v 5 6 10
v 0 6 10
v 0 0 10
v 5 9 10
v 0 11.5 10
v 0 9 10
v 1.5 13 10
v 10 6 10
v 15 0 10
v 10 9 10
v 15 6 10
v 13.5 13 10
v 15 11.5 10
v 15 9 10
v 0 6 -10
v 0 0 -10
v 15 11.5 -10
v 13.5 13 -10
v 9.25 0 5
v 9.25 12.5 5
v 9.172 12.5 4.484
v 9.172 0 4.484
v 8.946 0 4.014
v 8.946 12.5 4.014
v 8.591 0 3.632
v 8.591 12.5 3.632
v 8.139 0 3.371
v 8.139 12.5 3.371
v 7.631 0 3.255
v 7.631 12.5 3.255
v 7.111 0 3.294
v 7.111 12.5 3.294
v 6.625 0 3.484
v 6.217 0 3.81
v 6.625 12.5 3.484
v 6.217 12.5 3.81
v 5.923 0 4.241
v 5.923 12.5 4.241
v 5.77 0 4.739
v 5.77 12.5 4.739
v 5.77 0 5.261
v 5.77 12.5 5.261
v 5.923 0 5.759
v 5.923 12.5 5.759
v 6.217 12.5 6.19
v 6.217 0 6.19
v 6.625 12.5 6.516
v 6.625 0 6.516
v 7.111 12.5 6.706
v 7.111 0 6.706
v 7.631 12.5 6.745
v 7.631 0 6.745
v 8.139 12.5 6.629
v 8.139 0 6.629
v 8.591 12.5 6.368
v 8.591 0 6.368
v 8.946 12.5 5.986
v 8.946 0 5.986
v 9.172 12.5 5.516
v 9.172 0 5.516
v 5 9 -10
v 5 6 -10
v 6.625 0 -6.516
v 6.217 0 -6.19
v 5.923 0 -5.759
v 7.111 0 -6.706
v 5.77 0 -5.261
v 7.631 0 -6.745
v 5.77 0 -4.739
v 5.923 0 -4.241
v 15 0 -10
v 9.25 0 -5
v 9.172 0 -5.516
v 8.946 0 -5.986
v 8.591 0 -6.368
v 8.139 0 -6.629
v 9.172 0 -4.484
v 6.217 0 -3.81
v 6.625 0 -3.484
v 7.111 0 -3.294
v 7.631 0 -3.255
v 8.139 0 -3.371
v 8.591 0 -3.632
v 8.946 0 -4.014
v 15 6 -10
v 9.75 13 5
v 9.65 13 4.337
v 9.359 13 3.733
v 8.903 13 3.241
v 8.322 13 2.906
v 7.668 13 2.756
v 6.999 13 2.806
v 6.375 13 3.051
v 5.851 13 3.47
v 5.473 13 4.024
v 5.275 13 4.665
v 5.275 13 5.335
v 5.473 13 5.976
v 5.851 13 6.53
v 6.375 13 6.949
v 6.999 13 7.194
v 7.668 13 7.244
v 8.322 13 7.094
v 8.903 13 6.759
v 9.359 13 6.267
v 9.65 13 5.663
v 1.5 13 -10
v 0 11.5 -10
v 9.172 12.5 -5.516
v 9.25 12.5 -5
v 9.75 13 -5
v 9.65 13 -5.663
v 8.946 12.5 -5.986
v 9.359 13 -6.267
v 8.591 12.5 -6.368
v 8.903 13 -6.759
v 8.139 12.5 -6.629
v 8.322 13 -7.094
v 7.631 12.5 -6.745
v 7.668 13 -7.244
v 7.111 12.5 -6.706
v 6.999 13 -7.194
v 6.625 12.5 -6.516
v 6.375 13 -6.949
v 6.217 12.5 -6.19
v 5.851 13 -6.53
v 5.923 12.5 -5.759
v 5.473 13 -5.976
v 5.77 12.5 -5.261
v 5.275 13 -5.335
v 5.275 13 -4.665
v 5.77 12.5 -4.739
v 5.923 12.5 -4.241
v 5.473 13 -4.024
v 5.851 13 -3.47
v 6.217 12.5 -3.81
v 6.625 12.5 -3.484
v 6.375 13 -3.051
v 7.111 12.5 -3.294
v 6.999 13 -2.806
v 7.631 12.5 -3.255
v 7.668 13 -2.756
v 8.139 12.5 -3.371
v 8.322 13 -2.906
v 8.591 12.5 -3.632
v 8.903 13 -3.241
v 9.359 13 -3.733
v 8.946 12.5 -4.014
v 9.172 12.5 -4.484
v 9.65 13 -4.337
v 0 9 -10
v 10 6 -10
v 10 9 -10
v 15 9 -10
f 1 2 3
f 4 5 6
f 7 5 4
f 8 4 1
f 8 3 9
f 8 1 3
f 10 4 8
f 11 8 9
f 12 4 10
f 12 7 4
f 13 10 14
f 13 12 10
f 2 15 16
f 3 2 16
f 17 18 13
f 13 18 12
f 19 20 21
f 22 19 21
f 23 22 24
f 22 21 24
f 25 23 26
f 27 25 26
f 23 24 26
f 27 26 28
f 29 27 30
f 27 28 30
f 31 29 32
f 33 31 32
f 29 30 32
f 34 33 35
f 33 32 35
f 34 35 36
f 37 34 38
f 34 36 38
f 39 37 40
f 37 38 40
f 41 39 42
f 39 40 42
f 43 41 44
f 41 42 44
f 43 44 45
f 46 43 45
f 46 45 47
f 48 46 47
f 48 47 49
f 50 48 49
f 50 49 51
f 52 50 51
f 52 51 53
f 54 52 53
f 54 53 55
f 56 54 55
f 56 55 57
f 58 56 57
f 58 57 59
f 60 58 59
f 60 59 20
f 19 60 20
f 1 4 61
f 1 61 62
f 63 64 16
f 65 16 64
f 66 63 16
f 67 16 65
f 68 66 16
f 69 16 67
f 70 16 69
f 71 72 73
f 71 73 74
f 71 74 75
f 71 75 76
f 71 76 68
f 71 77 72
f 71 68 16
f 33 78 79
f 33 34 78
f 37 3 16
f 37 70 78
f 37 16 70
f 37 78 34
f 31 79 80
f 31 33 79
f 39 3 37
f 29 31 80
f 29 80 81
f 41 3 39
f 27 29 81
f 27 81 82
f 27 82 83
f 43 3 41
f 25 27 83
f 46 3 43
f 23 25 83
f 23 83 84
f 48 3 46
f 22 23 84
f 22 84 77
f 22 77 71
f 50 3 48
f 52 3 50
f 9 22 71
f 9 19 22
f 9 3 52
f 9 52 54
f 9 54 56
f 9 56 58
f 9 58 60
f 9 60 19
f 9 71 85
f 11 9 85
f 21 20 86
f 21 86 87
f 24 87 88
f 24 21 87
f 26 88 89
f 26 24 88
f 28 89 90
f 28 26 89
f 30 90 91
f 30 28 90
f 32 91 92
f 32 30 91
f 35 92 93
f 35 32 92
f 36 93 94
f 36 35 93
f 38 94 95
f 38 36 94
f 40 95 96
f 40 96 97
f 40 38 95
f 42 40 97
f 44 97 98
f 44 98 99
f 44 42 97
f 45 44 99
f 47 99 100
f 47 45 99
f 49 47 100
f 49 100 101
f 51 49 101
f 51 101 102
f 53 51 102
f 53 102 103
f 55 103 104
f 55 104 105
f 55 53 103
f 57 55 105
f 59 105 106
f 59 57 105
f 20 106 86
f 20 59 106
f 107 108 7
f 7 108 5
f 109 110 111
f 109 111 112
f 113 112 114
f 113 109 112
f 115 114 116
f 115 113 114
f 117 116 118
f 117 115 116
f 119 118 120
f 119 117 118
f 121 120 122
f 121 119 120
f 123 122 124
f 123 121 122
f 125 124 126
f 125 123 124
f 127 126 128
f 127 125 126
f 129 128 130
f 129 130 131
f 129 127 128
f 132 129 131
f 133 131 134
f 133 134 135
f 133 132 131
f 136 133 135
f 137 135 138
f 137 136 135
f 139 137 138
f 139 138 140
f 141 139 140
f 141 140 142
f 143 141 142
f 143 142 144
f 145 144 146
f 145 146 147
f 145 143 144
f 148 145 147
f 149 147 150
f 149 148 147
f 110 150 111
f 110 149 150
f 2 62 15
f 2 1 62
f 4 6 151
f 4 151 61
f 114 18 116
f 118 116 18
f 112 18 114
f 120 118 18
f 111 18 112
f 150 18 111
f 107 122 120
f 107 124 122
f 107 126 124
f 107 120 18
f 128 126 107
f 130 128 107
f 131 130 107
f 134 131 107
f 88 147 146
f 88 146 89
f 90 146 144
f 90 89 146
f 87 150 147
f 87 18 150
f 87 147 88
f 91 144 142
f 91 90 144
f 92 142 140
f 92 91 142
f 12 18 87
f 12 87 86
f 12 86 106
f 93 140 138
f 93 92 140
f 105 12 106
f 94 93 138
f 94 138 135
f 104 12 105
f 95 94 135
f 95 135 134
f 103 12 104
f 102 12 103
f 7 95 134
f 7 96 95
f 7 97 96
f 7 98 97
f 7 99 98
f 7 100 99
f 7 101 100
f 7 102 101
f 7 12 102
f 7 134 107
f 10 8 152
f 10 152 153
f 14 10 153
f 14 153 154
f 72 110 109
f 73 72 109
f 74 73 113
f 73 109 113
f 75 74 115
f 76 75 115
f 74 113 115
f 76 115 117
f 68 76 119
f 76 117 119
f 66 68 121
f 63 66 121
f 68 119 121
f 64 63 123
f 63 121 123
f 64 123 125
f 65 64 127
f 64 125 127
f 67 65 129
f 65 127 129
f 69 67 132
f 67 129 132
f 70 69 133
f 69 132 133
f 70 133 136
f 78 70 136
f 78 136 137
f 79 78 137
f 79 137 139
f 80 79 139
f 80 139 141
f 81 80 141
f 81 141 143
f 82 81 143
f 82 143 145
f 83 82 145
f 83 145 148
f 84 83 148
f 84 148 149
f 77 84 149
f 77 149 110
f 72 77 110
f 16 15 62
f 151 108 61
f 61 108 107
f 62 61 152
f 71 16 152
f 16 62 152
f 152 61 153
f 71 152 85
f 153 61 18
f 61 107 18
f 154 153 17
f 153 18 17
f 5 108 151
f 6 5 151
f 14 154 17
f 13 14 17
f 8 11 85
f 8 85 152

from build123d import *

# Parameters (mm, degrees)
BOSS_EXTRUDE1_DEPTH = 10
SKETCH2_R           = 1.75
CUT_EXTRUDE1_DEPTH  = 14
CHAMFER1_SIZE       = 1.5
CHAMFER3_SIZE       = 0.5


with BuildPart() as part:
    # Sketch1 → Boss-Extrude1 (new body, symmetric)
    with BuildSketch(Plane.XY):
        Polygon((0, 0), (15, 0), (15, 6), (10, 6), (10, 9), (15, 9), (15, 13), (0, 13), (0, 9), (5, 9), (5, 6), (0, 6), align=None)
    extrude(amount=BOSS_EXTRUDE1_DEPTH, both=True)

    # Sketch2 → Cut-Extrude1 (cut, through all)
    with BuildSketch(Plane(origin=(0, 13, 0), x_dir=(1, 0, 0), z_dir=(0, 1, 0))):
        with Locations((7.5, -5)):
            Circle(SKETCH2_R)
        with Locations((7.5, 5)):
            Circle(SKETCH2_R)
    extrude(amount=-CUT_EXTRUDE1_DEPTH, mode=Mode.SUBTRACT)

    # Chamfer1
    chamfer1_edges = [part.edges().sort_by_distance(p)[0] for p in [
        (0, 13, 0),
        (15, 13, 0),
    ]]
    chamfer(chamfer1_edges, length=CHAMFER1_SIZE)

    # Chamfer3
    chamfer3_edges = [part.edges().sort_by_distance(p)[0] for p in [
        (5.75, 13, 5),
        (5.75, 13, -5),
    ]]
    chamfer(chamfer3_edges, length=CHAMFER3_SIZE)


solid = part.part
